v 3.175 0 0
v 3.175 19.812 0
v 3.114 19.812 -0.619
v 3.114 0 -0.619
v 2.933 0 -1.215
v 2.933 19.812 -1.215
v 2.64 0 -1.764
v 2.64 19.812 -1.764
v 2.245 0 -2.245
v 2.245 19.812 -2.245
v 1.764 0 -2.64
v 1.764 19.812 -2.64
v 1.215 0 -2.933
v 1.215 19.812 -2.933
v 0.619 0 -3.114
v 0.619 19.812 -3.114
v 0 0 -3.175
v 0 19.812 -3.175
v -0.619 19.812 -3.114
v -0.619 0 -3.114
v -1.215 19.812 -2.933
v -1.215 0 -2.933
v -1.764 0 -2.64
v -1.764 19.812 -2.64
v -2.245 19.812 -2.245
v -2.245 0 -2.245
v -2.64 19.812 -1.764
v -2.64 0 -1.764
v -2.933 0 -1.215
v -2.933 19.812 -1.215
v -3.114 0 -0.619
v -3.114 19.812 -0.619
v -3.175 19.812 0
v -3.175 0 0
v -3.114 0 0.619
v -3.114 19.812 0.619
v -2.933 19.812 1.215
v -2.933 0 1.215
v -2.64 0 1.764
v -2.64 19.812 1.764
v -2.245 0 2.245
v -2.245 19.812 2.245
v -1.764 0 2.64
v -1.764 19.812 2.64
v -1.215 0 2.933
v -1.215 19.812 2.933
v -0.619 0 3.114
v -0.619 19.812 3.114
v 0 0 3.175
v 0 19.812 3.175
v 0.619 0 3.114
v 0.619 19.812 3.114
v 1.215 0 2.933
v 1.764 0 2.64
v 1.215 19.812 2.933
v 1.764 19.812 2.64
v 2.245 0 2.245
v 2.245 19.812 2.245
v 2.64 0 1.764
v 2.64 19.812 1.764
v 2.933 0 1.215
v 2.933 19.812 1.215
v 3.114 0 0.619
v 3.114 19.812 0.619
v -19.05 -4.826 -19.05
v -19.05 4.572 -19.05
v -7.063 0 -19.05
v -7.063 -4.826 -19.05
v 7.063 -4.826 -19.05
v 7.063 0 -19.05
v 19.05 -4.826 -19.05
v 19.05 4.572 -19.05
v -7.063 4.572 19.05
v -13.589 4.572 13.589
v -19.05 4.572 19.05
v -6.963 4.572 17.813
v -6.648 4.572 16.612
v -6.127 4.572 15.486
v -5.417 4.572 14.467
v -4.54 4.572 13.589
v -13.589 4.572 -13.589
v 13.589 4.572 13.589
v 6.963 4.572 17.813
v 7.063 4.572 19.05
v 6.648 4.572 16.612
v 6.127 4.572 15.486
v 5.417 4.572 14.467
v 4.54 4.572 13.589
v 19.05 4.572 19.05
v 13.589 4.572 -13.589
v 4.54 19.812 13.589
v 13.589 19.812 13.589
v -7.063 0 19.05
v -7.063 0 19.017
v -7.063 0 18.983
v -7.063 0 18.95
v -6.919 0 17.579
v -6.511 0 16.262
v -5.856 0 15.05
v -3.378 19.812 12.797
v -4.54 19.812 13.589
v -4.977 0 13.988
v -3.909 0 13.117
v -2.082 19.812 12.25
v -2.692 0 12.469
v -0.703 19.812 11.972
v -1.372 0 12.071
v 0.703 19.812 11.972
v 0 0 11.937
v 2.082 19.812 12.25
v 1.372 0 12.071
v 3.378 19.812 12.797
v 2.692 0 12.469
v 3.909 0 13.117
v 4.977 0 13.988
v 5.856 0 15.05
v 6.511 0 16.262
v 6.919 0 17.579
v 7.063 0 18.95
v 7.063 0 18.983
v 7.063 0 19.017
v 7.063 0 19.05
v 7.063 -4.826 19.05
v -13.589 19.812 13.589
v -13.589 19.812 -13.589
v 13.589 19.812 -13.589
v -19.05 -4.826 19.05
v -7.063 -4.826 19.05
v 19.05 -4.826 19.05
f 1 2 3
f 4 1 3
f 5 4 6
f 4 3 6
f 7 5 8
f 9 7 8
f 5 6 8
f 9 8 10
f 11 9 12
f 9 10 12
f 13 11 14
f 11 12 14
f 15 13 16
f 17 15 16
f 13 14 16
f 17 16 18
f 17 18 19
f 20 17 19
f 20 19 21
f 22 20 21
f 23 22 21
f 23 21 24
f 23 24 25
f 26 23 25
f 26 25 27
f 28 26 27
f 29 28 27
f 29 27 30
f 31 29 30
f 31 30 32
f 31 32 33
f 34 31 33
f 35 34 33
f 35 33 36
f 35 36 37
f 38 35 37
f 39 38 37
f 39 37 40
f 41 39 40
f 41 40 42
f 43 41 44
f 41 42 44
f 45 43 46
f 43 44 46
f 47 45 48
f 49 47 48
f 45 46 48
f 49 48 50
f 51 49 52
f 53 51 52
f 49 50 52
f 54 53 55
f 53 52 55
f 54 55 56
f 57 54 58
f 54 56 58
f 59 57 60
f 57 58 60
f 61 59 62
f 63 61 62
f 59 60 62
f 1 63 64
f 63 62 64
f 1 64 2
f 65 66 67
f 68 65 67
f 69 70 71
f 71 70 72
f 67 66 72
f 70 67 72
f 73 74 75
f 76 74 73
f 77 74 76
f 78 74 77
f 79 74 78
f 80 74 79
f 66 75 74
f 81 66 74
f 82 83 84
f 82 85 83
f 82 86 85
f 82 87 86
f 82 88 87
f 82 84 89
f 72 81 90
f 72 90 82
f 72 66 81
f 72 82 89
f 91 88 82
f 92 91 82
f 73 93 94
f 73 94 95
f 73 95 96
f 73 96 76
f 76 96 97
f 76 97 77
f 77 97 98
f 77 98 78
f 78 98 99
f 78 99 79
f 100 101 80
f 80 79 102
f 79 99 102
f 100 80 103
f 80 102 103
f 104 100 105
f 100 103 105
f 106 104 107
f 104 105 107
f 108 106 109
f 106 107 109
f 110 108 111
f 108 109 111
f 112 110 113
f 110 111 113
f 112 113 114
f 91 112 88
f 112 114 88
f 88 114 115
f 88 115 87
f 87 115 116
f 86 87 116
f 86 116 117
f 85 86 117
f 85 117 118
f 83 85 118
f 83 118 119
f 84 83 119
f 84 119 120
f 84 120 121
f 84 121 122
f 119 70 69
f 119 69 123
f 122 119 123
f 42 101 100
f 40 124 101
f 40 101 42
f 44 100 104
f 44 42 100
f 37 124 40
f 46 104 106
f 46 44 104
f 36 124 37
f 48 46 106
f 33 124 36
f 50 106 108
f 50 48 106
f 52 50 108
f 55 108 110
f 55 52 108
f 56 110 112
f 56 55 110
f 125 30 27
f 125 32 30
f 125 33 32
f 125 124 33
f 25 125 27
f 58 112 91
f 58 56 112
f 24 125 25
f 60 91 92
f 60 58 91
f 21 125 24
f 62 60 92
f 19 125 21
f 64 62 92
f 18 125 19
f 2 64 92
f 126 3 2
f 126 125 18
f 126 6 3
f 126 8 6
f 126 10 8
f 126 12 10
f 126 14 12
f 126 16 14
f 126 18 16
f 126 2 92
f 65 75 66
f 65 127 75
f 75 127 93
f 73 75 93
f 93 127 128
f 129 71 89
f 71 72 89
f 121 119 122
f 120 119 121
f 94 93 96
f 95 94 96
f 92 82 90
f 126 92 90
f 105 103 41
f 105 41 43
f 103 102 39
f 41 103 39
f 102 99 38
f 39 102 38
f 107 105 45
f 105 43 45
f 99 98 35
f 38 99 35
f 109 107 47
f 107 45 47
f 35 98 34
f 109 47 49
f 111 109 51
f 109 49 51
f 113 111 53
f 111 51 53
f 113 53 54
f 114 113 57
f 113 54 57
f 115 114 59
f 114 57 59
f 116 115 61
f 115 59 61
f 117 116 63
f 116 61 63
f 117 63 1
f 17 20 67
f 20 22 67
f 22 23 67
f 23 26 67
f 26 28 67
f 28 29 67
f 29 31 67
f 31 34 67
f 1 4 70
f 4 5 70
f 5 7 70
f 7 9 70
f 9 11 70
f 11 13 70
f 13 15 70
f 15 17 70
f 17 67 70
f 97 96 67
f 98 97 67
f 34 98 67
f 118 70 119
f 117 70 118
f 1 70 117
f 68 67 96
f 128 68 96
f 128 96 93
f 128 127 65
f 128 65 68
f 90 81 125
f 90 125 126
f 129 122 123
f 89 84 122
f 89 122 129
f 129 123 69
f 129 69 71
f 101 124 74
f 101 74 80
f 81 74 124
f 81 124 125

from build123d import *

# Parameters (mm, degrees)
SKETCH1_W               = 38.1
SKETCH1_H               = 38.1
BOSS_EXTRUDE1_DEPTH     = 4.572
SKETCH5_W               = 27.178
SKETCH5_H               = 27.178
BOSS_EXTRUDE2_DEPTH     = 19.812
SKETCH2_R               = 7.06349997
CUT_EXTRUDE1_DEPTH      = 20.812
F_1_4_20_TAPPED_HOLE1_D = 6.35
SKETCH6_W               = 11.986676998
SKETCH6_H               = 38.1
BOSS_EXTRUDE3_DEPTH     = 4.826


with BuildPart() as part:
    # Sketch1 → Boss-Extrude1 (new body)
    with BuildSketch(Plane(origin=(0, 0, 0), x_dir=(1, 0, 0), z_dir=(0, 1, 0))):
        Rectangle(SKETCH1_W, SKETCH1_H)
    extrude(amount=BOSS_EXTRUDE1_DEPTH)

    # Sketch5 → Boss-Extrude2 (add)
    with BuildSketch(Plane(origin=(0, 0, 0), x_dir=(1, 0, 0), z_dir=(0, 1, 0))):
        Rectangle(SKETCH5_W, SKETCH5_H)
    extrude(amount=BOSS_EXTRUDE2_DEPTH)

    # Sketch2 → Cut-Extrude1 (cut, through all)
    with BuildSketch(Plane.XZ):
        with Locations((0, 19)):
            Circle(SKETCH2_R)
    extrude(amount=-CUT_EXTRUDE1_DEPTH, mode=Mode.SUBTRACT)

    # 1/4-20 Tapped Hole1 (through all)
    with Locations(Plane(origin=(0, 0, 0), x_dir=(-1, 0, 0), z_dir=(0, -1, 0))):
        with Locations((0, 0)):
            Hole(F_1_4_20_TAPPED_HOLE1_D / 2)

    # Sketch6 → Boss-Extrude3 (add)
    with BuildSketch(Plane.XZ):
        with Locations((13.056661501, 0)):
            Rectangle(SKETCH6_W, SKETCH6_H)
        with Locations((-13.056661501, 0)):
            Rectangle(SKETCH6_W, SKETCH6_H)
    extrude(amount=BOSS_EXTRUDE3_DEPTH)


solid = part.part
